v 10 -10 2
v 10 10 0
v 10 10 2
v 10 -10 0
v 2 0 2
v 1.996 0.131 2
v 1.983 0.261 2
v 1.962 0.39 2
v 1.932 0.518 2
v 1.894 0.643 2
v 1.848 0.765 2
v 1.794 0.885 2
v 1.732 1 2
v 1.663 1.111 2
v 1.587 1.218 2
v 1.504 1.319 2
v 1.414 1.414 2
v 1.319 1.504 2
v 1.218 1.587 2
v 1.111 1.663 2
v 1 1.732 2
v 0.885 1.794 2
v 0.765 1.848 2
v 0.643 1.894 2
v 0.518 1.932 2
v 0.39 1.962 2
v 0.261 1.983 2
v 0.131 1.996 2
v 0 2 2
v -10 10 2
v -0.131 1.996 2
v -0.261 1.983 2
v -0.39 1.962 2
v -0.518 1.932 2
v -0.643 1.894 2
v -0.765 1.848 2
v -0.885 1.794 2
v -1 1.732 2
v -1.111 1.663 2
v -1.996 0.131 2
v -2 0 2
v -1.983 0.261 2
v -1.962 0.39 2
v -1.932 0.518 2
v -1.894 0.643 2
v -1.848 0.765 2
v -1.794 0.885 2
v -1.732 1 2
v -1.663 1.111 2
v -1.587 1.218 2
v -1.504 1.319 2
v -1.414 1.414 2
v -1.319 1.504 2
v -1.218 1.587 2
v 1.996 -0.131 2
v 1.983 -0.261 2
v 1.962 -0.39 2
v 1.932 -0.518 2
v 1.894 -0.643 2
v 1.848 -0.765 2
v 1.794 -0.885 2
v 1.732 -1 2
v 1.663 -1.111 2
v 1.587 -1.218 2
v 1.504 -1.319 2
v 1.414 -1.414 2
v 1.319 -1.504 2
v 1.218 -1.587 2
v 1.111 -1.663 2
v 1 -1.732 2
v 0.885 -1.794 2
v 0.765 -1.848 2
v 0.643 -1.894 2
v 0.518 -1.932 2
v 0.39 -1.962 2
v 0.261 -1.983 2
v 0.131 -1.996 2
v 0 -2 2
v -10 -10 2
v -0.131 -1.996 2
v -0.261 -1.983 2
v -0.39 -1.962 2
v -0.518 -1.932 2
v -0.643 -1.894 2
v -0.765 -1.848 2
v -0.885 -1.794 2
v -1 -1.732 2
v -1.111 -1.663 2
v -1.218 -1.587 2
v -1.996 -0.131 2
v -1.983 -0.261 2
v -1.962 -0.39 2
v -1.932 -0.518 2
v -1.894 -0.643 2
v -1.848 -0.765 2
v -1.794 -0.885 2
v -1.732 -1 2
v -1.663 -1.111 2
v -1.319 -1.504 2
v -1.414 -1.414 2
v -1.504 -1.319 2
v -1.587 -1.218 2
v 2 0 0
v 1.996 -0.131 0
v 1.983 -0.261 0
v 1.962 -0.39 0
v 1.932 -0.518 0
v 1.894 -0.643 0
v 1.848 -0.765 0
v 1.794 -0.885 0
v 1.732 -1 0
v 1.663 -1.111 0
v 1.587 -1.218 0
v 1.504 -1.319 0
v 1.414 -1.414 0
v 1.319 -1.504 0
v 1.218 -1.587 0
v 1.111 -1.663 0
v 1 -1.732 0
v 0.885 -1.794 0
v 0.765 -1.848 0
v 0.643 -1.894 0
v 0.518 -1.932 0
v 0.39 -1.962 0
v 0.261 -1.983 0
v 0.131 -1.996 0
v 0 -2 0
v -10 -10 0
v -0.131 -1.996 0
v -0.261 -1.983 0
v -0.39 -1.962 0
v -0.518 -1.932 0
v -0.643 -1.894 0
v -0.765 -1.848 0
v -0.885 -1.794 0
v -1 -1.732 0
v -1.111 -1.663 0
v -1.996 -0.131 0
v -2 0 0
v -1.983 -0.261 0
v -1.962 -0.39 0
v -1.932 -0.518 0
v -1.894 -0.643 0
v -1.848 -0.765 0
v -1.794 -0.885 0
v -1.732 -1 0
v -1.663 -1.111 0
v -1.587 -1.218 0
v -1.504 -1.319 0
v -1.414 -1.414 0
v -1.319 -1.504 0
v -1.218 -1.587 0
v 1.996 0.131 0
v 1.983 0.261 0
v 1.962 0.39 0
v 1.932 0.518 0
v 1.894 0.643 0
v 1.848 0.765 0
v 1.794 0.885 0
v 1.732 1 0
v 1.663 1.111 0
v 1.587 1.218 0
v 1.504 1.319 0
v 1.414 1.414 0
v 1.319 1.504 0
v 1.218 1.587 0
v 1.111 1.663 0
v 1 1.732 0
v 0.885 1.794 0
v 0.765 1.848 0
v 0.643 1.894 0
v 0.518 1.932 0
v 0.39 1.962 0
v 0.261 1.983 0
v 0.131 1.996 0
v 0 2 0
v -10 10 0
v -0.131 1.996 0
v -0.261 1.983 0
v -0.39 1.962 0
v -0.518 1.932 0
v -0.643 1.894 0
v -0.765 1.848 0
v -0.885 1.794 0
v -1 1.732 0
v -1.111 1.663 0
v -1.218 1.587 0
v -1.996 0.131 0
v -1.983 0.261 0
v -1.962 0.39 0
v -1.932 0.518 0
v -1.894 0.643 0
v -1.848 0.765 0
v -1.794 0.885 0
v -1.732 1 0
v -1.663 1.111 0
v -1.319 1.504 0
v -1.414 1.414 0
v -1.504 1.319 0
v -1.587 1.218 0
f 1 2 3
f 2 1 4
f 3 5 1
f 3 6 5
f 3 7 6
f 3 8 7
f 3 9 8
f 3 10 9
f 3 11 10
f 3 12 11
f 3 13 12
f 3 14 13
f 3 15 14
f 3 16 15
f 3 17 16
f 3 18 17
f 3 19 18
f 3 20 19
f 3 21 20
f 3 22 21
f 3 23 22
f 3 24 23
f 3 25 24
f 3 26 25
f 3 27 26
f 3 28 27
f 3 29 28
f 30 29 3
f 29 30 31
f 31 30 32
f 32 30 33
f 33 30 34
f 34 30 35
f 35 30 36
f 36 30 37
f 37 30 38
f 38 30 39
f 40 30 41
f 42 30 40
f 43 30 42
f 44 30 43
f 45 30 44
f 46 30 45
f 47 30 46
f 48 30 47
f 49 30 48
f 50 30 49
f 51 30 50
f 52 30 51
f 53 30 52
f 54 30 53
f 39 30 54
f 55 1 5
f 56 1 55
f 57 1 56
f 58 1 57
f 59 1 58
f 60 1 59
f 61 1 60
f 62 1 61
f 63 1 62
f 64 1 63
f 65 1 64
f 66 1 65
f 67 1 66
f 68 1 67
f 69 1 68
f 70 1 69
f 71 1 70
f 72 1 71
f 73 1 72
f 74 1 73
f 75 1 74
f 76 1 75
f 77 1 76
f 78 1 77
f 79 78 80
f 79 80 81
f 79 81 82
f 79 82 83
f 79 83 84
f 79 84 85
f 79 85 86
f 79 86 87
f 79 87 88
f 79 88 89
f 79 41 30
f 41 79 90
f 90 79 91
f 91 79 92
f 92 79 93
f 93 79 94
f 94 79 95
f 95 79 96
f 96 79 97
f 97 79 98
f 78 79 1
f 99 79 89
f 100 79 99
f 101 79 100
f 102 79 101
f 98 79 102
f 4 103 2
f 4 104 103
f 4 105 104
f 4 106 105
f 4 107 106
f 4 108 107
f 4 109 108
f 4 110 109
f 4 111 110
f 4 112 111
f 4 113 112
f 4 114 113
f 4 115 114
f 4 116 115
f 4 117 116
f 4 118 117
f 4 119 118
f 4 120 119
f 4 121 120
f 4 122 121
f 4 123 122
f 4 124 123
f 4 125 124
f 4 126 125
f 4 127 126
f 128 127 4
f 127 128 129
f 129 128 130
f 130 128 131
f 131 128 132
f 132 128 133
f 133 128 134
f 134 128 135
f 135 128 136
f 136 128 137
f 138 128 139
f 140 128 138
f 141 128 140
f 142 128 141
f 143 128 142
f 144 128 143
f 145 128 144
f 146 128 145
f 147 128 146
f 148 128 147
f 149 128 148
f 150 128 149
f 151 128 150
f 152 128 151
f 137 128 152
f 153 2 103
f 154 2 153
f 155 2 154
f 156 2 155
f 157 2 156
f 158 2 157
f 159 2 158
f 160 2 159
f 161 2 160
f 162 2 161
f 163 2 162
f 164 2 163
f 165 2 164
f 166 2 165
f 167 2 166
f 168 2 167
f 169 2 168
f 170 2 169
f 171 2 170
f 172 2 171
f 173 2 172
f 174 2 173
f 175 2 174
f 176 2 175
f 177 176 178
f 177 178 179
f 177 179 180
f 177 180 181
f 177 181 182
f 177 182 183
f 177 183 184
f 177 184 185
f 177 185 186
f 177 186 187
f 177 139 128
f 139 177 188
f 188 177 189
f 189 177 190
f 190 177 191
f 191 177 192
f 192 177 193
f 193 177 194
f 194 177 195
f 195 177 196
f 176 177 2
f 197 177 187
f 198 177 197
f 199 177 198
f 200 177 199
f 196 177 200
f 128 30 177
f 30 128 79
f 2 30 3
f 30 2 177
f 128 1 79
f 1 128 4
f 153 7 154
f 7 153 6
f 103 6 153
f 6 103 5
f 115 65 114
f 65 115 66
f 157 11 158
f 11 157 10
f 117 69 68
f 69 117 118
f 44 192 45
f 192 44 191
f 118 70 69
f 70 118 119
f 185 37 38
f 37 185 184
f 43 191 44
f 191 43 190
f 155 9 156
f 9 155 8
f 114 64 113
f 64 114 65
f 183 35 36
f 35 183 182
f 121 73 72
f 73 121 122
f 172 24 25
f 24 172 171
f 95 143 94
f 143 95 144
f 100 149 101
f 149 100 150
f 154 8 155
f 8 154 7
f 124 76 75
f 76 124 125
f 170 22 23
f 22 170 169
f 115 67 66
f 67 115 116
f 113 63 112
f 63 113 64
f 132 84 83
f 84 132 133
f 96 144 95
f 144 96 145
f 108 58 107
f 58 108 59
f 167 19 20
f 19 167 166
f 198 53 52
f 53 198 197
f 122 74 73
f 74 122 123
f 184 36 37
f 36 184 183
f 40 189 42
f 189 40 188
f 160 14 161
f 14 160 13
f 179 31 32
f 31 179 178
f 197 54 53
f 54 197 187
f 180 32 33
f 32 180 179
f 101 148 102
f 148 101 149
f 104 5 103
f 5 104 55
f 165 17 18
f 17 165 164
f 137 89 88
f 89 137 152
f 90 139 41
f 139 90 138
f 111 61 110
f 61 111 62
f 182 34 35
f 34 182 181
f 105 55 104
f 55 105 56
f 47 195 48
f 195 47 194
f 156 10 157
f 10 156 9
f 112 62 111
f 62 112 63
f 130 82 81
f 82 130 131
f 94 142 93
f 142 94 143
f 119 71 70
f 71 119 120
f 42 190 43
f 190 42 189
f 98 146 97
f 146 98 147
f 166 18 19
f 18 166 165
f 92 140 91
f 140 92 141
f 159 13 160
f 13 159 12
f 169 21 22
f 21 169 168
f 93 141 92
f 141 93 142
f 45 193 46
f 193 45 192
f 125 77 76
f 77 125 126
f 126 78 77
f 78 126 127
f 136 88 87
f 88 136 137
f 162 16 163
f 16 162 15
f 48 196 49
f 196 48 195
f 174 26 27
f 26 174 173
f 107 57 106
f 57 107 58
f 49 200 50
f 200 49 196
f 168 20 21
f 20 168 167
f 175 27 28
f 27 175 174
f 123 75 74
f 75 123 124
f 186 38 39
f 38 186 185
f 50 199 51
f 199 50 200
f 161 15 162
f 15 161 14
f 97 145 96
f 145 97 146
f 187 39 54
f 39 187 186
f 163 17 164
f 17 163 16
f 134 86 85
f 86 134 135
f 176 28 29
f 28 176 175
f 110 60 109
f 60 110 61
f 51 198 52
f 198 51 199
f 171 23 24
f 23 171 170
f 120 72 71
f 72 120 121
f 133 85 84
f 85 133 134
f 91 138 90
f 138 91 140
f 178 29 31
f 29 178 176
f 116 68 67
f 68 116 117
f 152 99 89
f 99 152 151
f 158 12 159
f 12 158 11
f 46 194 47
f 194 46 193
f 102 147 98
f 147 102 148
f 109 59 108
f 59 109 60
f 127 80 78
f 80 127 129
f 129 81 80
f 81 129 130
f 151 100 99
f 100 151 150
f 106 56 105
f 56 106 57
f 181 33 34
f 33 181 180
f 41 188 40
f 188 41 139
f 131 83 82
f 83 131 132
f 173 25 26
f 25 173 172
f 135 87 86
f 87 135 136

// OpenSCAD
// Auto-generated from tests/data/feature_fixtures_manifest.json
// fixture: plate_square
// fixture_type: plate
// description: Square-aspect-ratio plate (20x20x2) with one centered hole. Tests non-elongated plate detection.
$fn = 96;

plate_size = [20.000000, 20.000000, 2.000000];
plate_origin = [-10.000000, -10.000000, 0.000000];

module through_hole(center, diameter, height) {
  translate(center) cylinder(d=diameter, h=height, center=false);
}

module through_slot(start, end, width, height) {
  hull() {
    through_hole(start, width, height);
    through_hole(end, width, height);
  }
}

module counterbore_hole(center, through_d, bore_d, bore_depth, plate_thickness) {
  translate([center[0], center[1], -0.1])
    cylinder(d=through_d, h=plate_thickness + 0.2, center=false);
  translate([center[0], center[1], plate_thickness - bore_depth])
    cylinder(d=bore_d, h=bore_depth + 0.1, center=false);
}

difference() {
  translate(plate_origin) cube(plate_size);
  through_hole([0.000000, 0.000000, -0.100000], 4.000000, 2.200000);  // hole_0
}
